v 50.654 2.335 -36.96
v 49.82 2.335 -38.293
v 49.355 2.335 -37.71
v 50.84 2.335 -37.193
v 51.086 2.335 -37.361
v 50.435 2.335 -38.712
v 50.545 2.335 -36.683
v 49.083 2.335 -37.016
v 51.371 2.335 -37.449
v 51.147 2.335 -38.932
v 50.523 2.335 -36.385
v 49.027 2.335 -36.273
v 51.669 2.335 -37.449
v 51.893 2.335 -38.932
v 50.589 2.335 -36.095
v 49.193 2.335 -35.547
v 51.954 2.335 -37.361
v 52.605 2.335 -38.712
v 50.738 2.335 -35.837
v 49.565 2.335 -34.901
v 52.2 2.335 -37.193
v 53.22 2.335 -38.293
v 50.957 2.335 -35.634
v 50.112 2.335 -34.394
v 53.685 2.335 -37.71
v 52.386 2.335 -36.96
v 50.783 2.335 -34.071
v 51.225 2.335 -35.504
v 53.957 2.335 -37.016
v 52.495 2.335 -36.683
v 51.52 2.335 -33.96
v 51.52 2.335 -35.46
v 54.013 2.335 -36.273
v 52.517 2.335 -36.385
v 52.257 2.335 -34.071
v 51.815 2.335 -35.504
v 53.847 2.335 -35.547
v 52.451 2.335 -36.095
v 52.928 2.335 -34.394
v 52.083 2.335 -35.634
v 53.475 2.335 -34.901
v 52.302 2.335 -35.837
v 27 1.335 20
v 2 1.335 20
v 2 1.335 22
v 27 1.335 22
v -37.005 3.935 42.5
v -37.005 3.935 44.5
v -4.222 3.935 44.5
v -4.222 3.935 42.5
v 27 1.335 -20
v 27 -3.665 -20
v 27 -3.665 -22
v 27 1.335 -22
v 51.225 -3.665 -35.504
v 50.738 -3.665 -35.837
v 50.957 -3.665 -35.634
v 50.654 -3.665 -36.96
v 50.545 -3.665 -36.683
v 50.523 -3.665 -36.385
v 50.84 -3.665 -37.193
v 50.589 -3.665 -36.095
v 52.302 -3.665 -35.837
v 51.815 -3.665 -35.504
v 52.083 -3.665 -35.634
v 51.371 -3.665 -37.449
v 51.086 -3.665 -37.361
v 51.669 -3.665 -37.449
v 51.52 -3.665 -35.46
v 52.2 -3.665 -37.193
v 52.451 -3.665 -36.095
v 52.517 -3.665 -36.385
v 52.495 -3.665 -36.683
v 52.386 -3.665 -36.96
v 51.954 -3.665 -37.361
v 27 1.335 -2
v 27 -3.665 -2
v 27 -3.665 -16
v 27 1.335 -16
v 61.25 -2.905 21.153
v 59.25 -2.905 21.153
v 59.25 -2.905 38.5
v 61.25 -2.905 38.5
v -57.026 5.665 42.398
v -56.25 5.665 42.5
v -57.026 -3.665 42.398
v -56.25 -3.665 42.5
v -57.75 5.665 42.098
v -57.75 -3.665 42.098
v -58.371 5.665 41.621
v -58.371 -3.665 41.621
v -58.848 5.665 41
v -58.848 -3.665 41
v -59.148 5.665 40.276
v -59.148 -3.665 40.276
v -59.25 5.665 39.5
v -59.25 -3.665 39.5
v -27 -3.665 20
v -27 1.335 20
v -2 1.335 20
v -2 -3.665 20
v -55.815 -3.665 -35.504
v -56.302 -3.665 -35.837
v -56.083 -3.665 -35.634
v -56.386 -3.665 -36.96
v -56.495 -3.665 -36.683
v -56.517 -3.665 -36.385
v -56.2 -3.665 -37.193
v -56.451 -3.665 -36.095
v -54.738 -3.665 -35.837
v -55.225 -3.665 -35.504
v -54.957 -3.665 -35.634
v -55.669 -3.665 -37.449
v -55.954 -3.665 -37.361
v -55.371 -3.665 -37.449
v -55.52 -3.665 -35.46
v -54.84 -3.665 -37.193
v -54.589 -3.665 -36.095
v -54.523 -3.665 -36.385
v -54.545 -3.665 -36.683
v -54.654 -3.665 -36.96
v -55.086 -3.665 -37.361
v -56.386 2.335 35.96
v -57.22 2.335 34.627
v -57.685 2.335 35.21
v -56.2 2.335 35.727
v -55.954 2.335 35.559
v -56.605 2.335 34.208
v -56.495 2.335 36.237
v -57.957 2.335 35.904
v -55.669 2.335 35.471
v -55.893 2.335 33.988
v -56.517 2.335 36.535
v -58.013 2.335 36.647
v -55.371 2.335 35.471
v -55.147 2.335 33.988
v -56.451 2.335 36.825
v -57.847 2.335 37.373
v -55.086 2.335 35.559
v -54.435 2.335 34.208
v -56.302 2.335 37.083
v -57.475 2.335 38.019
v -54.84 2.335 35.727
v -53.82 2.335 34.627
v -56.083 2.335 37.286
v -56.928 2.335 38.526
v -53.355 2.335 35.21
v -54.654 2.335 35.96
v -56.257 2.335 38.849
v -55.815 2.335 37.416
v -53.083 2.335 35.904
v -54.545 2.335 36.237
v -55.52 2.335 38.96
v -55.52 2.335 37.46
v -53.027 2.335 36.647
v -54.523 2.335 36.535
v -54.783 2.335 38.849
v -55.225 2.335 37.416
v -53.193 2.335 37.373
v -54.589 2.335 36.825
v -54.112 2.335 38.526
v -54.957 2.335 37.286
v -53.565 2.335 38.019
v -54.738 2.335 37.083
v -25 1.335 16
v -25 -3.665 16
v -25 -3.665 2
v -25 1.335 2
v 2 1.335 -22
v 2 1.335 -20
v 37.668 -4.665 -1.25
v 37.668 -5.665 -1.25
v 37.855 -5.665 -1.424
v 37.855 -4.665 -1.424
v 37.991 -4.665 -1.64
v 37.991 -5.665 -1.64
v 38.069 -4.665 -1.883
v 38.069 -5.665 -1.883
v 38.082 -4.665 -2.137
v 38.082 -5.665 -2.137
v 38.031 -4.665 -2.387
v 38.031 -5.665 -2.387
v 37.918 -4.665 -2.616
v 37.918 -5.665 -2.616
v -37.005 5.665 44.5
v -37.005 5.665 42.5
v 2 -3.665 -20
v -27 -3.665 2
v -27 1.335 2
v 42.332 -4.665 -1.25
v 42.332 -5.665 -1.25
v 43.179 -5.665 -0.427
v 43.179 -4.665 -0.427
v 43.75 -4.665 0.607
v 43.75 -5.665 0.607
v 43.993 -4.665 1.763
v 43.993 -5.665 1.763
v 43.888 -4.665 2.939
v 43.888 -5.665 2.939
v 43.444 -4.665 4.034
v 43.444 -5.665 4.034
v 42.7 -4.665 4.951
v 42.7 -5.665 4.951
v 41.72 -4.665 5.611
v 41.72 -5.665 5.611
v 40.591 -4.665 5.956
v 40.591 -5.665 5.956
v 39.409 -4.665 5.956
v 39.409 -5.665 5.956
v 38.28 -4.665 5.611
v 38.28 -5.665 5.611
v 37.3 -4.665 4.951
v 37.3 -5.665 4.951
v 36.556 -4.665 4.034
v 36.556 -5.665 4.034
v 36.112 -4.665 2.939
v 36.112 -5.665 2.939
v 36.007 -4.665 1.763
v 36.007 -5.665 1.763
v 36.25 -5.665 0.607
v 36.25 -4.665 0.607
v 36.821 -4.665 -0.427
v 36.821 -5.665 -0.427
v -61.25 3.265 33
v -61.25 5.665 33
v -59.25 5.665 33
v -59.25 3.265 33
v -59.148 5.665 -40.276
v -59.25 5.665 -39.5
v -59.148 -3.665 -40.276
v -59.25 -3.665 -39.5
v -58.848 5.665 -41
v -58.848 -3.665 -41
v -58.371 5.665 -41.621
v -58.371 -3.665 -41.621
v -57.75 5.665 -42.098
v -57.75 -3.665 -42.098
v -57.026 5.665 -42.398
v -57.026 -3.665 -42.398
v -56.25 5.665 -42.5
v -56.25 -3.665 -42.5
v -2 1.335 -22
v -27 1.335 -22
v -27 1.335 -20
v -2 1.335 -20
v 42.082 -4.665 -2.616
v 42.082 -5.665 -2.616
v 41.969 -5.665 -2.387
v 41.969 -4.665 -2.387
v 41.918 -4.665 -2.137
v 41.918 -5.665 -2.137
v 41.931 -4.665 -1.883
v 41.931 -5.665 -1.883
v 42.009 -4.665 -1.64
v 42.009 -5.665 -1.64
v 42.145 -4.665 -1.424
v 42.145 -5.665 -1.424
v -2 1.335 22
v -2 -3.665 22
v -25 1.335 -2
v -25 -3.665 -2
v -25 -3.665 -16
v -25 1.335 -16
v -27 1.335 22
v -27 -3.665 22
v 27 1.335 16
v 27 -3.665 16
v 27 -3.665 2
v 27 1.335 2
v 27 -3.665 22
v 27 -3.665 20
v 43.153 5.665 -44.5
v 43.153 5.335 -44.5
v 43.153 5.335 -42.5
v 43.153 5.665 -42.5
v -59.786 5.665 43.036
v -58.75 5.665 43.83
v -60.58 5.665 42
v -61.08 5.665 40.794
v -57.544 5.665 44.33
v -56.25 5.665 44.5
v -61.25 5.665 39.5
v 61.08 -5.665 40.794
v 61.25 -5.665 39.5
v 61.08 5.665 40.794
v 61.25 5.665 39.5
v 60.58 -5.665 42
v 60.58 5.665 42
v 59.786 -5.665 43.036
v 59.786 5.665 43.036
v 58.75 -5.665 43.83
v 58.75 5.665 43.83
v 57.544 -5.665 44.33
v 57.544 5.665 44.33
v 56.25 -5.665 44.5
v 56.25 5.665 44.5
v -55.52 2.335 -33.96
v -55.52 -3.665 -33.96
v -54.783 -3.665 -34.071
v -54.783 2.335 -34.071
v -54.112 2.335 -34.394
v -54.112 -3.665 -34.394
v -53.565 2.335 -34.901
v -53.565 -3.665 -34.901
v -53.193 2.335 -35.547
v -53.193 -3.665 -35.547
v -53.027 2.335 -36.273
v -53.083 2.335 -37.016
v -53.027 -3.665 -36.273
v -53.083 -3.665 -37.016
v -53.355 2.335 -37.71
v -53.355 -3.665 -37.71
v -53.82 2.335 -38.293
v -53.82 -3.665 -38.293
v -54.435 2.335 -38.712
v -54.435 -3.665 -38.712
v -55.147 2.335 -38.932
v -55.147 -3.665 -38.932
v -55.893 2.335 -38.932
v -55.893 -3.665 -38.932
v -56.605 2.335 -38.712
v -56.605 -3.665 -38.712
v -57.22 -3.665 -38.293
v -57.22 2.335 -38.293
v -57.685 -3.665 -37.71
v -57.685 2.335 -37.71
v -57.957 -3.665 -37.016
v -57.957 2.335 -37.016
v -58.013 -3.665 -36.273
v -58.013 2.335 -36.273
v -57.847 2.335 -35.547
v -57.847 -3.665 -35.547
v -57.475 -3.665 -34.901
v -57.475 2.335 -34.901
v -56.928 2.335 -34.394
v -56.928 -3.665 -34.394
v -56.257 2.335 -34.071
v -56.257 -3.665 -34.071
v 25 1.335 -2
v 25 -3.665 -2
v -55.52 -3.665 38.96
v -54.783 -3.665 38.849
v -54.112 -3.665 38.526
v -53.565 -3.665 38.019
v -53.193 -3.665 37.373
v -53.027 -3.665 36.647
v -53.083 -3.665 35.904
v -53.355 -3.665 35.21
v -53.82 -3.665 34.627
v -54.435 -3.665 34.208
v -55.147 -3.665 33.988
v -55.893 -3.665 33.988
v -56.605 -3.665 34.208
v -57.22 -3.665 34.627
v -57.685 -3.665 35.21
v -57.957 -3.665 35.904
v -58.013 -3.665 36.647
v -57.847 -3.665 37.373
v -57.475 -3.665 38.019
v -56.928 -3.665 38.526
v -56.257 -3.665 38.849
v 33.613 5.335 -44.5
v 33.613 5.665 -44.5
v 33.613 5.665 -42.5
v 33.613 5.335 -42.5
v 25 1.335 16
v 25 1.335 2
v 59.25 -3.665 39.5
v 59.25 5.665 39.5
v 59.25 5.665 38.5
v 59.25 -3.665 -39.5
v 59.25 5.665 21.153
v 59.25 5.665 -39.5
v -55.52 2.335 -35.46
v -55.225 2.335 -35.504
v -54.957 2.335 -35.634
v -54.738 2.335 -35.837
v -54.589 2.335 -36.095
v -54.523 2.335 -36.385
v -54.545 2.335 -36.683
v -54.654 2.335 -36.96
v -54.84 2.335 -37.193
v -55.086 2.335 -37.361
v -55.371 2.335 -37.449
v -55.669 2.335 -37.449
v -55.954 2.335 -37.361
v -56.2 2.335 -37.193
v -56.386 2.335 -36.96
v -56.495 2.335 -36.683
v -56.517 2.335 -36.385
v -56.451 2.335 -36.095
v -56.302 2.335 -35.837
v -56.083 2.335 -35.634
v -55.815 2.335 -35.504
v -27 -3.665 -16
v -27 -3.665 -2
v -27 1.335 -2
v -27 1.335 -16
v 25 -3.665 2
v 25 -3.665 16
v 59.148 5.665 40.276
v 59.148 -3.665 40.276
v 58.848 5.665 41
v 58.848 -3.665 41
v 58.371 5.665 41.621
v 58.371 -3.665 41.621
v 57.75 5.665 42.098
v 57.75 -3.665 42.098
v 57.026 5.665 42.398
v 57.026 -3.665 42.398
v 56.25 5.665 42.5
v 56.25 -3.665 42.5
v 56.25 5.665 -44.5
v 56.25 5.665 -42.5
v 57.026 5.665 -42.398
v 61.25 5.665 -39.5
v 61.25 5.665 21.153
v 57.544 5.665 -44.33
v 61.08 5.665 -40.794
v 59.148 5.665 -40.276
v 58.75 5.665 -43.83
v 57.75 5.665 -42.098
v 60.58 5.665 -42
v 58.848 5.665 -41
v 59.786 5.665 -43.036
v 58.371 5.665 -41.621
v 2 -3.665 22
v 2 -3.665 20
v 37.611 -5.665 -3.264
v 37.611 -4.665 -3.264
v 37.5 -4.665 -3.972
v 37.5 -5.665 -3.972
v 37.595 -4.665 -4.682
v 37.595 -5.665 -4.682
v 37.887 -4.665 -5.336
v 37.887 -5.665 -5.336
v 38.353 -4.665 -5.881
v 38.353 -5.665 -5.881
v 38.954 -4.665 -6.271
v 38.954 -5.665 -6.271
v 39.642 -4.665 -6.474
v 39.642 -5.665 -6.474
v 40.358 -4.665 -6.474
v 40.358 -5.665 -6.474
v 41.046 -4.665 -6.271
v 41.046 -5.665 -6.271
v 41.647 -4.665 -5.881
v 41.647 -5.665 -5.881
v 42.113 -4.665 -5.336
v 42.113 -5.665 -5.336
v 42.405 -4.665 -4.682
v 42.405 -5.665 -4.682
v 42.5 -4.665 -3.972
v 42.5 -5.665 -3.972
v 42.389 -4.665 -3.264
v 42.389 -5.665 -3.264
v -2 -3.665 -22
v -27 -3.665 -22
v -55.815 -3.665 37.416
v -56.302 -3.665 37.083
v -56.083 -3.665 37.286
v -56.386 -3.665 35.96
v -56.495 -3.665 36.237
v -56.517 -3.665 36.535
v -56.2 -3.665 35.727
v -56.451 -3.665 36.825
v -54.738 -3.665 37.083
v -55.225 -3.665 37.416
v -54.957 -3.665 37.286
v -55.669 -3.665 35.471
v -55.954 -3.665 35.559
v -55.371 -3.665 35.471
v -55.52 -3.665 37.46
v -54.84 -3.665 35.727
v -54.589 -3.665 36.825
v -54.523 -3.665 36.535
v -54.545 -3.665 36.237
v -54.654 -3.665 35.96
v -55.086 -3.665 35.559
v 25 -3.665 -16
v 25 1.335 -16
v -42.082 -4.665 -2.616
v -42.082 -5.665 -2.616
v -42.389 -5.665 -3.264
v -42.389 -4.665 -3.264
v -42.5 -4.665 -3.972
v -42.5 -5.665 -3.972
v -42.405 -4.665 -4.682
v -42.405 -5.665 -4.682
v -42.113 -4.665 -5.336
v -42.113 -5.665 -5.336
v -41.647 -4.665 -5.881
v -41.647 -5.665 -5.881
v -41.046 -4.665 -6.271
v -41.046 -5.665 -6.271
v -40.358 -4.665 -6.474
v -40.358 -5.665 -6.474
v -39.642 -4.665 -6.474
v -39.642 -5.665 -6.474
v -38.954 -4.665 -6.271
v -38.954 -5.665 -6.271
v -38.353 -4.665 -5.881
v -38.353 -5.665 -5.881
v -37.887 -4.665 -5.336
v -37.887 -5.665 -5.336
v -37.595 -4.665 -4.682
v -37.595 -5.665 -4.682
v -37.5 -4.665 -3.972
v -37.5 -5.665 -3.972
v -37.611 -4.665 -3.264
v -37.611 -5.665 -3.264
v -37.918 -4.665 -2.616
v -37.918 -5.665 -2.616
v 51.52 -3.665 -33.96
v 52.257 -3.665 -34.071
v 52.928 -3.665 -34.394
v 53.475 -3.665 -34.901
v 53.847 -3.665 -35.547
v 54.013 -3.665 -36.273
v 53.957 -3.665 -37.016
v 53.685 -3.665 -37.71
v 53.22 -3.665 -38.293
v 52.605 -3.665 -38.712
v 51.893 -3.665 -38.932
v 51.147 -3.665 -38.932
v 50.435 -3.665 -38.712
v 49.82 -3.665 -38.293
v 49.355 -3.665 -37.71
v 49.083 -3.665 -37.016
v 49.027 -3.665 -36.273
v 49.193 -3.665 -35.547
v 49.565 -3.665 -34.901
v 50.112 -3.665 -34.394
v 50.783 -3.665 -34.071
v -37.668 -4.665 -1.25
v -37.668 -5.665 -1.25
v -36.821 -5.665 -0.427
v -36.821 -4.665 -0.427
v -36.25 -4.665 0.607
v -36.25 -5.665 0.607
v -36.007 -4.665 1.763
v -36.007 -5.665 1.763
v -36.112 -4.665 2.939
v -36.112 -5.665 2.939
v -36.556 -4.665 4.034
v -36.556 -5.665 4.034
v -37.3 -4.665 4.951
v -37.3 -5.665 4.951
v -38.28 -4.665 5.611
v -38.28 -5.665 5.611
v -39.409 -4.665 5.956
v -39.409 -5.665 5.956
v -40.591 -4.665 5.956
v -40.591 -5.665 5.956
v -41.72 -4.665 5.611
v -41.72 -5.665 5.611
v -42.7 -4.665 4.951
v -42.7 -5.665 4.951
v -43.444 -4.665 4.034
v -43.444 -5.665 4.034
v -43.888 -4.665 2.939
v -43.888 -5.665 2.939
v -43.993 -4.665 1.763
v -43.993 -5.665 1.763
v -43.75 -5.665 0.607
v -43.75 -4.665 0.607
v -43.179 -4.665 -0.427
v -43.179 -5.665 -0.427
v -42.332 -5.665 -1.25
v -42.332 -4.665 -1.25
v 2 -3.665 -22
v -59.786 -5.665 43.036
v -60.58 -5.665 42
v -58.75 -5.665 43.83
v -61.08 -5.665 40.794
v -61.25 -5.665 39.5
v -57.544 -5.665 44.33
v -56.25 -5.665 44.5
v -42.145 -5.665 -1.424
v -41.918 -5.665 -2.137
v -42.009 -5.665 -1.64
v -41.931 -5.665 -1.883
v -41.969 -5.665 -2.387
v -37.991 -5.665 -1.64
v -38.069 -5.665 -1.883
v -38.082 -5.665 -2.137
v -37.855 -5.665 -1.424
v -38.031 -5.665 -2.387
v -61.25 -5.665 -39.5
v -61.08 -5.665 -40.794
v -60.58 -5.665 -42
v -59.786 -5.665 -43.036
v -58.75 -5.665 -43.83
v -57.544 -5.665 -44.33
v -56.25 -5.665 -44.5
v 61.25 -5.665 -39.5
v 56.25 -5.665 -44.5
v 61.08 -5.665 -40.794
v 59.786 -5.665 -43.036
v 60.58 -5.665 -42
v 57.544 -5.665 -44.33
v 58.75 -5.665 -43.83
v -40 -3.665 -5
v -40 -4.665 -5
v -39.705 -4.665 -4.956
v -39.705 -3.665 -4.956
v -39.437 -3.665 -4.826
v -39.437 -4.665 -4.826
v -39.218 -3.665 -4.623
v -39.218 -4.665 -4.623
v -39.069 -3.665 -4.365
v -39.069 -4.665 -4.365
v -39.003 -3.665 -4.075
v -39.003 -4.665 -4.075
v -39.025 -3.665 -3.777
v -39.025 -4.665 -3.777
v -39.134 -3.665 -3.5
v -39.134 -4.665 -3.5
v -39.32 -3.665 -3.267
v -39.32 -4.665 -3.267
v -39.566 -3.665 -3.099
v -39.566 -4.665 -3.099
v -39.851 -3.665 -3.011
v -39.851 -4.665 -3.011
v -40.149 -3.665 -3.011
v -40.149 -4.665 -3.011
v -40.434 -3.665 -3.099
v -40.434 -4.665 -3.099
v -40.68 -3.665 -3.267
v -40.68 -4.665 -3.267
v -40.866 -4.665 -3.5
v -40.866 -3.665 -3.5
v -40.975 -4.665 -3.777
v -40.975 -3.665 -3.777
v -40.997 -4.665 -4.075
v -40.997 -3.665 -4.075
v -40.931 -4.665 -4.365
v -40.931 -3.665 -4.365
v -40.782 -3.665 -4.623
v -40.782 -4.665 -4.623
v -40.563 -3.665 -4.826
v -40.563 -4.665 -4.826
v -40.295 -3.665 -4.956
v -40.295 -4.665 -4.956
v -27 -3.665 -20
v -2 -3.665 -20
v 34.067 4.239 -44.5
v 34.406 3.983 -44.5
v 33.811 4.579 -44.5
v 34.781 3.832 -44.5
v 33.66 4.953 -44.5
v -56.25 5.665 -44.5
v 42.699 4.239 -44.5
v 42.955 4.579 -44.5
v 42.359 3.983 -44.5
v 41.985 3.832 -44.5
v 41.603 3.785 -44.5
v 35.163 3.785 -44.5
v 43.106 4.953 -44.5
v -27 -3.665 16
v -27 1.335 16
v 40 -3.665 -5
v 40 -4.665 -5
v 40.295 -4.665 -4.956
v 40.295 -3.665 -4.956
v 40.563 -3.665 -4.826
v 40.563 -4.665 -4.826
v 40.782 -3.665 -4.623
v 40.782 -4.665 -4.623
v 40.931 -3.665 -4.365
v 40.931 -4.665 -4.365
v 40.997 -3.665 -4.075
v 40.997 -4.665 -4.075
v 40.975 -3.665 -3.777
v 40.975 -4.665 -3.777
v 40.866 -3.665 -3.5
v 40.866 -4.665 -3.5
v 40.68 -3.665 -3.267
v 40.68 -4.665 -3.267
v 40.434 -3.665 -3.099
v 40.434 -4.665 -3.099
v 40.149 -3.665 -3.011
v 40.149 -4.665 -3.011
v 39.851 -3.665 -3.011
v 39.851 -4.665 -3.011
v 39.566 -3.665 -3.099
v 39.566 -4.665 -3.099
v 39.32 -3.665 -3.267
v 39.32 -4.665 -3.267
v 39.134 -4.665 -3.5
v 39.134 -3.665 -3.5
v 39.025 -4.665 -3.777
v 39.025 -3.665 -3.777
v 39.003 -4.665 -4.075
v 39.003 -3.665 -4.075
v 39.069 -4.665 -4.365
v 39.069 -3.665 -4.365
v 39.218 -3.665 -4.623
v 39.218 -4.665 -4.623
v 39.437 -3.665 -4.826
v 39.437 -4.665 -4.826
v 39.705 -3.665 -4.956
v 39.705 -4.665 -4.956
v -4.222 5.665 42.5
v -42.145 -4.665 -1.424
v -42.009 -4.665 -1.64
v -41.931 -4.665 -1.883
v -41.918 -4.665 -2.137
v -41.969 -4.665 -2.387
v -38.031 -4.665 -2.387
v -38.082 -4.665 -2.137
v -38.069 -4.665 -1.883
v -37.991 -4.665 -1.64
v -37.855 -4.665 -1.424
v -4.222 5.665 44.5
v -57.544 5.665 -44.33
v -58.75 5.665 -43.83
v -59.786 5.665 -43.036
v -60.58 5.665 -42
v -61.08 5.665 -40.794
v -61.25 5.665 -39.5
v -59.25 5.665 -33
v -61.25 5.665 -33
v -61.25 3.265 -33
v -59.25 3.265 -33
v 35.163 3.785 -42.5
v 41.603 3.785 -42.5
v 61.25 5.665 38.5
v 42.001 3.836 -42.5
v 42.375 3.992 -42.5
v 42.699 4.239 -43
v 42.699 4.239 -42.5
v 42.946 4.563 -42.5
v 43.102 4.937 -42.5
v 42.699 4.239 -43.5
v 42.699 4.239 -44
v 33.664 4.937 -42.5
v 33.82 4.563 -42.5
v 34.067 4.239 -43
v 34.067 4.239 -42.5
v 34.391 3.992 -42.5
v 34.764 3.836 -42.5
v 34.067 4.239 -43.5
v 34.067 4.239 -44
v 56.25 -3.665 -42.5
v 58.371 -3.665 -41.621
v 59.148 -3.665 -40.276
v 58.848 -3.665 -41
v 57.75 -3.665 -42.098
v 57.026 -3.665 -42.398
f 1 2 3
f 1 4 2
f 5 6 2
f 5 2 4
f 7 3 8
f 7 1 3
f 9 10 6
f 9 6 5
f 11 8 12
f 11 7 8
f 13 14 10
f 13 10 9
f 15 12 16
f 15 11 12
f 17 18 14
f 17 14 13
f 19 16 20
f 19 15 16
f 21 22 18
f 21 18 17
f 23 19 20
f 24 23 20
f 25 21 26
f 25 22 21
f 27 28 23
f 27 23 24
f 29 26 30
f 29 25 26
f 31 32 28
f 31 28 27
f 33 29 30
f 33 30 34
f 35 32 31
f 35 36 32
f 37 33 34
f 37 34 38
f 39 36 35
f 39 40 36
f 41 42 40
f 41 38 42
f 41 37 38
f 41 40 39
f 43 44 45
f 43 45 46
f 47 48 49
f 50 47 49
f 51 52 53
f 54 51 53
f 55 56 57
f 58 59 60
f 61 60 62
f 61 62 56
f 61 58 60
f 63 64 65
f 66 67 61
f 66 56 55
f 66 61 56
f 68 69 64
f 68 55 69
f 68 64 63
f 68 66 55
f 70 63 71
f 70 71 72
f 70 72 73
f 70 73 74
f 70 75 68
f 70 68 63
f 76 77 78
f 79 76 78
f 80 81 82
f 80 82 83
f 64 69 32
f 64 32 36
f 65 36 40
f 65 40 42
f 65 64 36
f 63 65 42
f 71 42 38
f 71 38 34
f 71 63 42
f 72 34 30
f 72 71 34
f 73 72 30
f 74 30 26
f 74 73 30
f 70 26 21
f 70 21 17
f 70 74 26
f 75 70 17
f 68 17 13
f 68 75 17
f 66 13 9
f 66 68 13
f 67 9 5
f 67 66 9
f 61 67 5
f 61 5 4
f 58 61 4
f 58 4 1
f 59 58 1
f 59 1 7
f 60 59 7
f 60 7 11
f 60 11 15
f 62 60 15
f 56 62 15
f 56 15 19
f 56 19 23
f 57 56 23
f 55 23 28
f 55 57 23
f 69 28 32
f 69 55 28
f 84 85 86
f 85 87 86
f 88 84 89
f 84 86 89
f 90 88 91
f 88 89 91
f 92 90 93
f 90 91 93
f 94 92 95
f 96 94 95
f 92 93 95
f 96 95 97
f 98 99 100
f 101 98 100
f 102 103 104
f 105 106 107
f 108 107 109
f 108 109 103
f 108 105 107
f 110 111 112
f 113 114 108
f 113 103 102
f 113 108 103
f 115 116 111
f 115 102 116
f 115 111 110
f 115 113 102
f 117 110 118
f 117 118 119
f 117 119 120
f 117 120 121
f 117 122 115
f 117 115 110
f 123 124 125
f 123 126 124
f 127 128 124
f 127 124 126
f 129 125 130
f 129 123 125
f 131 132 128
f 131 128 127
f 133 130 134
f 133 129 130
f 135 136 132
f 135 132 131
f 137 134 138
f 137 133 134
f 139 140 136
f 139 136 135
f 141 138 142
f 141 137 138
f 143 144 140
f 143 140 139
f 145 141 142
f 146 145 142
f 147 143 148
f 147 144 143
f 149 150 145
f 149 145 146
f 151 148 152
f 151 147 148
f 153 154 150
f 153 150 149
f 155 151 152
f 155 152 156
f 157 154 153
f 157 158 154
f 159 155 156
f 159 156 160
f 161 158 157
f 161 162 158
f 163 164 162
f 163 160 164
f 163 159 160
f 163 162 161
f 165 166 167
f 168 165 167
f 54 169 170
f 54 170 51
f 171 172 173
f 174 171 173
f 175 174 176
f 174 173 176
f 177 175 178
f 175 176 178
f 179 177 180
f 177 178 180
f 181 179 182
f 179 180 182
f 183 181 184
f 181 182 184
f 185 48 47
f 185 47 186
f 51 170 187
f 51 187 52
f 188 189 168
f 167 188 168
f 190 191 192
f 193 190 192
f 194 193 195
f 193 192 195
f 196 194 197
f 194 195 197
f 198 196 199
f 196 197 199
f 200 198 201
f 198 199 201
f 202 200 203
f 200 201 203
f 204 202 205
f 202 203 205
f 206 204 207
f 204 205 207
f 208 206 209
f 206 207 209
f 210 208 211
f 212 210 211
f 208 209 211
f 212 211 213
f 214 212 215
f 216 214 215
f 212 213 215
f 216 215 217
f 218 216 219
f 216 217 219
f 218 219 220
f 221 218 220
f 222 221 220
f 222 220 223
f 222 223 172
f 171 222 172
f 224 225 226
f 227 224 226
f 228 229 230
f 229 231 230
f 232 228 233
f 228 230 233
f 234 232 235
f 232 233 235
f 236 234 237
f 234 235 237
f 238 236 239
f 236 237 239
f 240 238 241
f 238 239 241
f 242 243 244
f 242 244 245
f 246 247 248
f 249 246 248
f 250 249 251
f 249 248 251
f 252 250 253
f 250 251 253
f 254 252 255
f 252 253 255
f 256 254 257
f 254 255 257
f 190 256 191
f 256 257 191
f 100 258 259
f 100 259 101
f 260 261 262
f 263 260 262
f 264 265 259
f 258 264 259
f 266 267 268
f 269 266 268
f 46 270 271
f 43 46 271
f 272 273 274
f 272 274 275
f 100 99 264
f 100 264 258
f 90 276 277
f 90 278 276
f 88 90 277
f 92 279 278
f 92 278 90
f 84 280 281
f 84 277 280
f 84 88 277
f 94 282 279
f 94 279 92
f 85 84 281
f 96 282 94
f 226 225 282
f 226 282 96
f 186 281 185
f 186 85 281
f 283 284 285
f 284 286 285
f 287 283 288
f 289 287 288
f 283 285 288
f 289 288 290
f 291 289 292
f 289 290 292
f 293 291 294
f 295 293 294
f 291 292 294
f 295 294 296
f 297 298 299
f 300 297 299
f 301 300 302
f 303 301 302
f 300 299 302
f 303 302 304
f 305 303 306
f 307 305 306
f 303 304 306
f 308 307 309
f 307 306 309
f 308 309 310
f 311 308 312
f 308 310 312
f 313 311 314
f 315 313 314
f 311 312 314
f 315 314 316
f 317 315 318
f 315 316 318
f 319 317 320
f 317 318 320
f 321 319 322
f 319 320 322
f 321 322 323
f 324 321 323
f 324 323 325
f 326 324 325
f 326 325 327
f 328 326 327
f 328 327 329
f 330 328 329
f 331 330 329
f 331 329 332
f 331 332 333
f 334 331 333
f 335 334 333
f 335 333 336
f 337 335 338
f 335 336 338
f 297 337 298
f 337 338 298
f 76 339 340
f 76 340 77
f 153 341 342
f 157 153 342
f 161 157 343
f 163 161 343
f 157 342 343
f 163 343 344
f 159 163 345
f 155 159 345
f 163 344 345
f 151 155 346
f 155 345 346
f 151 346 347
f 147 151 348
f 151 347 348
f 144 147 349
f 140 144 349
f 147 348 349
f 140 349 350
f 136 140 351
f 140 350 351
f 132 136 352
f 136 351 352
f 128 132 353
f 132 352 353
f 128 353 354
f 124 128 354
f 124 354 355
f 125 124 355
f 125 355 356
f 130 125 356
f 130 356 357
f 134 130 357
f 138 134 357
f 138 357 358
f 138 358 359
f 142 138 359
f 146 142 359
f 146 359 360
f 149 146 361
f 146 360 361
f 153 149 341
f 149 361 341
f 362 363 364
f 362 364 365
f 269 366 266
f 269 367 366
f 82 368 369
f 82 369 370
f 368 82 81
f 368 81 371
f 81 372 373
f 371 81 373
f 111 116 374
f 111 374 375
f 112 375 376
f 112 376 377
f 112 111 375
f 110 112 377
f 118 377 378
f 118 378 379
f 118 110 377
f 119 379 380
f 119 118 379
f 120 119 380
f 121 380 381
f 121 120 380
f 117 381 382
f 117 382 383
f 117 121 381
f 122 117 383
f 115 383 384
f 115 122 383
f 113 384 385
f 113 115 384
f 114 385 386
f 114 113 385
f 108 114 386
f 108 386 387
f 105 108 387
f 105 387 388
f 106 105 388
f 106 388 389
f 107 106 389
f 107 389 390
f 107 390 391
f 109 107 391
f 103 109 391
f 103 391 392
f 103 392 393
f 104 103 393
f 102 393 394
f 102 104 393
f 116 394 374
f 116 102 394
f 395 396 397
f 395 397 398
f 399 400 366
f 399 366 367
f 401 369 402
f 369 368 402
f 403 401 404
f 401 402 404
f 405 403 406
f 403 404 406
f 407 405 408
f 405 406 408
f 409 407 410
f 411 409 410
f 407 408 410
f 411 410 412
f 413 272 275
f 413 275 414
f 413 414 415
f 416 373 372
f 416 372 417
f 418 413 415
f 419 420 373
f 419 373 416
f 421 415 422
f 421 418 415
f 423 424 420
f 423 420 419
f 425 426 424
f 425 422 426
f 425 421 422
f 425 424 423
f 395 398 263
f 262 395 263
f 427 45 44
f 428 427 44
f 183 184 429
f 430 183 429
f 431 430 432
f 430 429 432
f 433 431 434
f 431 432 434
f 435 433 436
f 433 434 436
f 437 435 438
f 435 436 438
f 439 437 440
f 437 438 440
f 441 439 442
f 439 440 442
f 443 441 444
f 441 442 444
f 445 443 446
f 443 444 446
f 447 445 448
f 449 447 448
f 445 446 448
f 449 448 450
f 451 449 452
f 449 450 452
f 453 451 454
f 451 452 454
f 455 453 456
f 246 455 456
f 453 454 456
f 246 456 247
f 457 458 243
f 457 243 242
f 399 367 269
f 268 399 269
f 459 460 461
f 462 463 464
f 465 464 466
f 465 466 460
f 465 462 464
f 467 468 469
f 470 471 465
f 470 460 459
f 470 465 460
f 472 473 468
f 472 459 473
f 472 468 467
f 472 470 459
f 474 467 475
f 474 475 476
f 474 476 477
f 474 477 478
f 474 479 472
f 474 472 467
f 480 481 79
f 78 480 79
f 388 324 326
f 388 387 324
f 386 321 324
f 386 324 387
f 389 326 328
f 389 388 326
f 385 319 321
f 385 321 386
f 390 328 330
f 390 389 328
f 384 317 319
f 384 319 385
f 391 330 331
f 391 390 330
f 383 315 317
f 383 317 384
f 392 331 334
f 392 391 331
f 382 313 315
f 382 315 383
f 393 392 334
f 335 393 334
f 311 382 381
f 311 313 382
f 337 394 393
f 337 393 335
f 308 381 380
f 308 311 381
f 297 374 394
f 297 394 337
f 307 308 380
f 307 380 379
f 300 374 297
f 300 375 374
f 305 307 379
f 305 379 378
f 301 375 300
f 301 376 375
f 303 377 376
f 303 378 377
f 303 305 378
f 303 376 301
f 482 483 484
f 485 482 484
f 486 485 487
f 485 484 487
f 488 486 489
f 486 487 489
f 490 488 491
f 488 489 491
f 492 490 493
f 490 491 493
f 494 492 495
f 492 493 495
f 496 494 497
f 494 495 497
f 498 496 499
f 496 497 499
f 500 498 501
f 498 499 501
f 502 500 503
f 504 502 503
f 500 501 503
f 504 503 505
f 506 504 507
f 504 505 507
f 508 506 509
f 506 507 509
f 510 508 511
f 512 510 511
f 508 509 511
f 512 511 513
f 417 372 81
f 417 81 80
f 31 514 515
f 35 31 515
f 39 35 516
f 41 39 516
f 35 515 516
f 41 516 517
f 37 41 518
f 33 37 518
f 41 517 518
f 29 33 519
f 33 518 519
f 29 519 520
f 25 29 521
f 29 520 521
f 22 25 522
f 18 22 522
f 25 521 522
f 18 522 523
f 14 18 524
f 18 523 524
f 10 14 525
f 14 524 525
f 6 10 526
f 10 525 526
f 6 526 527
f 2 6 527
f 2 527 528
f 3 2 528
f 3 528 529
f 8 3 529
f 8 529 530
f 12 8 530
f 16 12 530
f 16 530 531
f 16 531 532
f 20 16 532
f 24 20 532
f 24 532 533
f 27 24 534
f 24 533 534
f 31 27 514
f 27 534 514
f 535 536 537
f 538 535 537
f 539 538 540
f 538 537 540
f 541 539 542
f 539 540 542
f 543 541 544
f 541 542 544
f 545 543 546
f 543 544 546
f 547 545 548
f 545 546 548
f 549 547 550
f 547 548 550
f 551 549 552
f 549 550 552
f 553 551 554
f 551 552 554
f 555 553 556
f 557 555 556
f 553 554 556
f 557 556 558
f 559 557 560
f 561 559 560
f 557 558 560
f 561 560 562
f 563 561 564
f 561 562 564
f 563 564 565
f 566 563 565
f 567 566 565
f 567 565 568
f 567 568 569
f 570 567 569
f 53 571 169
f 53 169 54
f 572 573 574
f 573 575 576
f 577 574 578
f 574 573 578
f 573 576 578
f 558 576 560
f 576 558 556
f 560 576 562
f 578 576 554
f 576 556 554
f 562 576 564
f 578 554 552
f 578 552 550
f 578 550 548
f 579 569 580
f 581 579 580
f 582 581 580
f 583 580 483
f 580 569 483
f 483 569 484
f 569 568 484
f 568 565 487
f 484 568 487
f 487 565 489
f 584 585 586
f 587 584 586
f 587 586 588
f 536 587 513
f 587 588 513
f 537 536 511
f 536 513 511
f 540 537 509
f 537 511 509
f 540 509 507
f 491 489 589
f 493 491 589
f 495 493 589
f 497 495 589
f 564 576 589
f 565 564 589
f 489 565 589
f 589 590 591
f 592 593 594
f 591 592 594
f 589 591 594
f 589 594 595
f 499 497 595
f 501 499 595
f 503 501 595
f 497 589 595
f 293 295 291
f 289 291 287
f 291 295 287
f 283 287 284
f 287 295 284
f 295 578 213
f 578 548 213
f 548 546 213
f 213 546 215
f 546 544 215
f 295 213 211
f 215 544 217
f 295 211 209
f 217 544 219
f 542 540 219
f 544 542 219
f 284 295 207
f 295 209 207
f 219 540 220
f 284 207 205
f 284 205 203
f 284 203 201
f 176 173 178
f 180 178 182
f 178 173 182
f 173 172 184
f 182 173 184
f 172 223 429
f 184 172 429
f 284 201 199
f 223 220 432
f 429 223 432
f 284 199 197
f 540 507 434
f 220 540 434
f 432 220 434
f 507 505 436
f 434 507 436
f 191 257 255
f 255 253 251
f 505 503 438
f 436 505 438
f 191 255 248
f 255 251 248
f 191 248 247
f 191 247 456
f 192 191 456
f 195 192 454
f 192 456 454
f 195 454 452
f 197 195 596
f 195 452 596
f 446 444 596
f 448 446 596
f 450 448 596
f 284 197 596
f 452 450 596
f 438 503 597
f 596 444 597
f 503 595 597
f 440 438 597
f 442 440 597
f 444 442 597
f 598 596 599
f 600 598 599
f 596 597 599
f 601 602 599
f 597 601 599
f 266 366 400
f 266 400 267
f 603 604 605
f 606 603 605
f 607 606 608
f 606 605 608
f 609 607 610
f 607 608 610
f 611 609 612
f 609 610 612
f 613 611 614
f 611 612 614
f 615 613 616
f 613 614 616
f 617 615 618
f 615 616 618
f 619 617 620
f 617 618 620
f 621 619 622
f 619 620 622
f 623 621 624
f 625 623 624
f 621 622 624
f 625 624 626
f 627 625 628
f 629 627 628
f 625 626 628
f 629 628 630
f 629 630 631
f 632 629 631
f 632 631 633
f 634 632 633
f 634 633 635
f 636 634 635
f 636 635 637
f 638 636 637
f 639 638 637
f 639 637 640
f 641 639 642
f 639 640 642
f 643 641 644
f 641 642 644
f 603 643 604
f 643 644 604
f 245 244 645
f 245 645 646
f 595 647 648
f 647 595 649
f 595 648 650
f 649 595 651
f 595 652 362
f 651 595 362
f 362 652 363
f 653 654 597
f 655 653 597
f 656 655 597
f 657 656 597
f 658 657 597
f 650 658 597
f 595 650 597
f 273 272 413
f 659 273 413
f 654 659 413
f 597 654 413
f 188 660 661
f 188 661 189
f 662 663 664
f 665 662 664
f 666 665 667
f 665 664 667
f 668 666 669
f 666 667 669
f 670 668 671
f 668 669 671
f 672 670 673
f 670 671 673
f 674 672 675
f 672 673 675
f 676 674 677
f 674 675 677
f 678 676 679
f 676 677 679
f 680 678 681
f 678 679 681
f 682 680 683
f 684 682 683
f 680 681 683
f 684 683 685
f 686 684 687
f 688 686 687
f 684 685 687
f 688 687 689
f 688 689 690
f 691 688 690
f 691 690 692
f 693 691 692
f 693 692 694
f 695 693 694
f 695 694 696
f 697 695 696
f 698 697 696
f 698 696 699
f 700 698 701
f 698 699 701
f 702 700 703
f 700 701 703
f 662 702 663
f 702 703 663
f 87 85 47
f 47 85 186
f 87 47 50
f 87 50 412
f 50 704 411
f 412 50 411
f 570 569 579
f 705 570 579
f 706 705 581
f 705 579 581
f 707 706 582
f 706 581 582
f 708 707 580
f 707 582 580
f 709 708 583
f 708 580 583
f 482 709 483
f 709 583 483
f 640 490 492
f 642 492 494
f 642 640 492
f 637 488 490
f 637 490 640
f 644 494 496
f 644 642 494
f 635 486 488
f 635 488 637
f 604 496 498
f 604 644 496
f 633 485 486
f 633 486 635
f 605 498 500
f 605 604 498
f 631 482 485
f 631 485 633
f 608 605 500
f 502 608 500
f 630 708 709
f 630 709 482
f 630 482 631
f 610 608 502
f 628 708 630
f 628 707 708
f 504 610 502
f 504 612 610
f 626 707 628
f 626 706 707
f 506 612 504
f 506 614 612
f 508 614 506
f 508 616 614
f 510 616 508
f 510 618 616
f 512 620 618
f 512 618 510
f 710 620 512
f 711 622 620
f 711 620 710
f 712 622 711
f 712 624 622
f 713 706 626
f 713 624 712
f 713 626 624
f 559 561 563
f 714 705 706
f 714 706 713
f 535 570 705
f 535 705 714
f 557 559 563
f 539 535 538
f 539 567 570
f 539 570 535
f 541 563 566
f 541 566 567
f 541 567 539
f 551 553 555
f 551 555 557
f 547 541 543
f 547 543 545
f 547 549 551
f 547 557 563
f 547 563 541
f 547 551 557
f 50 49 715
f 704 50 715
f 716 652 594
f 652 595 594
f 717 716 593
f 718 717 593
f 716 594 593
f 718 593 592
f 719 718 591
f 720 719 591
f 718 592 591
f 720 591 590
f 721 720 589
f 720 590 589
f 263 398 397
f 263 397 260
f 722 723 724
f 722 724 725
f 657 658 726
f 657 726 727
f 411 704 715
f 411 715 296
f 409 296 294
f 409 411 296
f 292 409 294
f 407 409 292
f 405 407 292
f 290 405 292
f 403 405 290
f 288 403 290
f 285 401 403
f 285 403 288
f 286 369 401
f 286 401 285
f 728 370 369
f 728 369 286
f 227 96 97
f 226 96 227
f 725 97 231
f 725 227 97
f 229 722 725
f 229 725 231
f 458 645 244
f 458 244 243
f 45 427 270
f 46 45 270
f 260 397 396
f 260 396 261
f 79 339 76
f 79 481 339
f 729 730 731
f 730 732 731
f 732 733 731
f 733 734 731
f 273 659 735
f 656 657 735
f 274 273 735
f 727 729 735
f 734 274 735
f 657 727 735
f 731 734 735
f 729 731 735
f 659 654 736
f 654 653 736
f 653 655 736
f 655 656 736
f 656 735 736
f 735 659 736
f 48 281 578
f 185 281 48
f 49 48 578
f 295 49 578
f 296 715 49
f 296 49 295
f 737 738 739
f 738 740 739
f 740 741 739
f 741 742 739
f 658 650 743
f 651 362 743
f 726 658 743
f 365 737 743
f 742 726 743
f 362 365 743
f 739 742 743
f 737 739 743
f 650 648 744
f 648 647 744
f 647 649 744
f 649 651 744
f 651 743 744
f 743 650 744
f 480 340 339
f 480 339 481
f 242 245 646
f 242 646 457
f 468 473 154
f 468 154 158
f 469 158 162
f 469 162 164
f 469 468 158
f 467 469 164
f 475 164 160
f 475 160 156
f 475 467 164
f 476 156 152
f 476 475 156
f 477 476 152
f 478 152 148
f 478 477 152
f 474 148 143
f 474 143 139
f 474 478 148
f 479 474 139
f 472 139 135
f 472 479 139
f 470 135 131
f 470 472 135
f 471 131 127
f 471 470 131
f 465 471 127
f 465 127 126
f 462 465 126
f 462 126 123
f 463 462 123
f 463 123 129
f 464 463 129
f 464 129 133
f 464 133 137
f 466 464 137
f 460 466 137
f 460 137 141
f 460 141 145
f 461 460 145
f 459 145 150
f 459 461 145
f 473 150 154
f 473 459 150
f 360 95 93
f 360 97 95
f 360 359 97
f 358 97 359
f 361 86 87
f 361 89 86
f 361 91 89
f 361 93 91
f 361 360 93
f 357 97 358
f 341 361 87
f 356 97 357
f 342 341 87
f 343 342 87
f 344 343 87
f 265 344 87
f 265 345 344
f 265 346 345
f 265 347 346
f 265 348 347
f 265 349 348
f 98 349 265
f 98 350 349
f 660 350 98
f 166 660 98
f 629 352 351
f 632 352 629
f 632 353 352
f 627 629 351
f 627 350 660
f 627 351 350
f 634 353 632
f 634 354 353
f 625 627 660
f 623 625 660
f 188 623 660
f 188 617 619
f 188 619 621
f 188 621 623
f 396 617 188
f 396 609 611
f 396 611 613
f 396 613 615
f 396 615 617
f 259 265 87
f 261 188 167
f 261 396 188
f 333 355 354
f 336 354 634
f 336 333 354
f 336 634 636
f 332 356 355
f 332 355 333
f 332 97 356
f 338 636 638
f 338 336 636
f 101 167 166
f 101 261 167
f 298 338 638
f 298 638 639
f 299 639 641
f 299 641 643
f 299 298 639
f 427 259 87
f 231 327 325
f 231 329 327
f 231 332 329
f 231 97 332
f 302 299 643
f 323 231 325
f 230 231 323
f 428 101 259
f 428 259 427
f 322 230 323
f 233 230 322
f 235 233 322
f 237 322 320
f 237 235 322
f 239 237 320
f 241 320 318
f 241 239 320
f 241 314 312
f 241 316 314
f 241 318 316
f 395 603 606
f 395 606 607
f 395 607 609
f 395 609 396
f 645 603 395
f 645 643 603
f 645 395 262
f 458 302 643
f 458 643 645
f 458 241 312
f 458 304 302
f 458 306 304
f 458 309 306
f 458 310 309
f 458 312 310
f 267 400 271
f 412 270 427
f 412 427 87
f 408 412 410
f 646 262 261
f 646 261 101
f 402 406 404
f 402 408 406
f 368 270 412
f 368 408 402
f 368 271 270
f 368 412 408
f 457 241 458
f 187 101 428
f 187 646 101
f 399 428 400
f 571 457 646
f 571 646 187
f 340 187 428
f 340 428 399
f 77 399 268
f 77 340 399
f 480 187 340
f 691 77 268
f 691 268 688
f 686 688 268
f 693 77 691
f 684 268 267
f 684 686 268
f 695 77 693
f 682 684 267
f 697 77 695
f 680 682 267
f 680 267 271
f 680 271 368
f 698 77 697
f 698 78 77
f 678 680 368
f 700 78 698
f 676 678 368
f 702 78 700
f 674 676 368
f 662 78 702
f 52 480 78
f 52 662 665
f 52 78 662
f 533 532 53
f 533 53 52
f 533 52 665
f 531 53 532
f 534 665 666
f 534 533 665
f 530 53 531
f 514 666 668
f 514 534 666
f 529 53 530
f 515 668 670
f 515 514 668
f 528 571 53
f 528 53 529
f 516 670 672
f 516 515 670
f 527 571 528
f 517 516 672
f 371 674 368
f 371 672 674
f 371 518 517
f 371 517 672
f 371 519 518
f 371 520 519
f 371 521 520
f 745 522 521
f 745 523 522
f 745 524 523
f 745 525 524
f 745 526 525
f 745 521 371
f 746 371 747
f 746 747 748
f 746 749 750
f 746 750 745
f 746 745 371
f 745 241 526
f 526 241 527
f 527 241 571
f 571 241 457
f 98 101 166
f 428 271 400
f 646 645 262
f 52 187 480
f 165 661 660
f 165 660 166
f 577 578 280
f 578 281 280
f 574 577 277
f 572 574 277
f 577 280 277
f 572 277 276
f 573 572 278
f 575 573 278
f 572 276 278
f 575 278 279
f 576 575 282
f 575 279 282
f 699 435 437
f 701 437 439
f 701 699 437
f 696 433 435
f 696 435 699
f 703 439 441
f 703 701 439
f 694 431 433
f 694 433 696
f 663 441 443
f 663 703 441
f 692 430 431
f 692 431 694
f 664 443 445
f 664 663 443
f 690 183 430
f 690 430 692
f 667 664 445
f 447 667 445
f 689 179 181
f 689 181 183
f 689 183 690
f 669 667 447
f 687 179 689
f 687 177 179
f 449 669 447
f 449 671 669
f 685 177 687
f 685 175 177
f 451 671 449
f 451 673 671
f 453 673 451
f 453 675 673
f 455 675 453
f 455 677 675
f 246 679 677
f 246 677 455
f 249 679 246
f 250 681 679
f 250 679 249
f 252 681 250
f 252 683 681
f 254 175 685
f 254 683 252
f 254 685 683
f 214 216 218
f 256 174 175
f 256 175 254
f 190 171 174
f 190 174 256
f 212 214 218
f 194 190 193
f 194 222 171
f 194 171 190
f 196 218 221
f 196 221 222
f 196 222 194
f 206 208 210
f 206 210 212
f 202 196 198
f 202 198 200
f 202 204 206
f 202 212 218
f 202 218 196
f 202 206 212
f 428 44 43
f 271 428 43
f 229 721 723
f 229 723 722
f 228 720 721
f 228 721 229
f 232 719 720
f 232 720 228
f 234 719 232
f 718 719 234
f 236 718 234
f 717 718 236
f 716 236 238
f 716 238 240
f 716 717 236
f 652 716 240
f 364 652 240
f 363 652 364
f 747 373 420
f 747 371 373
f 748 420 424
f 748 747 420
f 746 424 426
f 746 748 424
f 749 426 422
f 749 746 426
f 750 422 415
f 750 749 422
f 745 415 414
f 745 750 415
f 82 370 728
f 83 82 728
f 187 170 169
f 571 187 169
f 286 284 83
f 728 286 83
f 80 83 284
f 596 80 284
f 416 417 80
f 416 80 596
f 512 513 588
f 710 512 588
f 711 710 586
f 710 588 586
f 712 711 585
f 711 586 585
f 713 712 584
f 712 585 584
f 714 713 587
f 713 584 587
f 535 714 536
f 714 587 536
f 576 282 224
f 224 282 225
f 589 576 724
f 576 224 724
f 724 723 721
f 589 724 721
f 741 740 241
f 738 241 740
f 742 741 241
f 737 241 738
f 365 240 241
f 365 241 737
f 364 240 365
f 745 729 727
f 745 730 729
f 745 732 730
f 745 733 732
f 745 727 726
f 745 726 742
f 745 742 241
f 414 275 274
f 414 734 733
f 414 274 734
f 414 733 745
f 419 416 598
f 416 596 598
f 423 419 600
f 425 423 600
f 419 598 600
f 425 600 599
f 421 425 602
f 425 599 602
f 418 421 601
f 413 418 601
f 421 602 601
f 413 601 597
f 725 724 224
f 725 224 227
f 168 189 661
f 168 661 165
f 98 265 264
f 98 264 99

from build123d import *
from OCP.BRepFilletAPI import BRepFilletAPI_MakeFillet

# Parameters (mm, degrees)
SKETCH1_W           = 122.5
SKETCH1_H           = 89
BOSS_EXTRUDE1_DEPTH = 5.665
SHELL1_T            = -2
SKETCH2_R           = 2.5
SKETCH2_R_2         = 1
BOSS_EXTRUDE2_DEPTH = 6
FILLET1_R1          = 3
FILLET1_R2          = 5
SKETCH6_W           = 2
SKETCH6_H           = 66
CUT_EXTRUDE1_DEPTH  = 2.4
SKETCH7_W           = 2
SKETCH7_H           = 17.347336969
CUT_EXTRUDE2_DEPTH  = 8.57
CUT_EXTRUDE5_DEPTH  = 10
SKETCH13_W          = 32.782947734
SKETCH13_H          = 2.623502387
CUT_EXTRUDE6_DEPTH  = 10
SKETCH14_W          = 54
SKETCH14_H          = 44
SKETCH14_W_2        = 50
SKETCH14_H_2        = 40
BOSS_EXTRUDE3_DEPTH = 5
SKETCH15_W          = 2
SKETCH15_H          = 4
SKETCH15_W_2        = 4
SKETCH15_H_2        = 2
CUT_EXTRUDE7_DEPTH  = 5
CUT_EXTRUDE9_DEPTH  = 1
SKETCH17_R          = 1
CUT_EXTRUDE10_DEPTH = 1


with BuildPart() as part:
    # Sketch1 → Boss-Extrude1 (new, symmetric)
    with BuildSketch(Plane(origin=(0, 0, 0), x_dir=(1, 0, 0), z_dir=(0, 1, 0))):
        Rectangle(SKETCH1_W, SKETCH1_H)
    extrude(amount=BOSS_EXTRUDE1_DEPTH, both=True)

    # Shell1
    shell1_openings = [part.faces().sort_by_distance(p)[0] for p in [
        (0, 5.665, 0),
    ]]
    offset(amount=SHELL1_T, openings=shell1_openings, kind=Kind.INTERSECTION)

    # Sketch2 → Boss-Extrude2 (add)
    # profile 1 of 3: a face of its own
    with BuildSketch(Plane(origin=(0, -3.665, 0), x_dir=(1, 0, 0), z_dir=(0, 1, 0))):
        with Locations((-55.52, 36.46)):
            Circle(SKETCH2_R)
        with Locations((-55.52, 36.46)):
            Circle(SKETCH2_R_2, mode=Mode.SUBTRACT)
    # profile 2 of 3: a face of its own
    with BuildSketch(Plane(origin=(0, -3.665, 0), x_dir=(1, 0, 0), z_dir=(0, 1, 0))):
        with Locations((51.52, 36.46)):
            Circle(SKETCH2_R)
        with Locations((51.52, 36.46)):
            Circle(SKETCH2_R_2, mode=Mode.SUBTRACT)
    # profile 3 of 3: a face of its own
    with BuildSketch(Plane(origin=(0, -3.665, 0), x_dir=(1, 0, 0), z_dir=(0, 1, 0))):
        with Locations((-55.52, -36.46)):
            Circle(SKETCH2_R)
        with Locations((-55.52, -36.46)):
            Circle(SKETCH2_R_2, mode=Mode.SUBTRACT)
    extrude(amount=BOSS_EXTRUDE2_DEPTH)

    # Fillet1: one fillet with a radius per group of edges: ONE call of the kernel's fillet builder (fillet() takes one radius for all edges)
    fillet1_edges_1 = [part.edges().sort_by_distance(p)[0] for p in [
        (-59.25, 1, -42.5),
        (59.25, 1, -42.5),
        (59.25, 1, 42.5),
        (-59.25, 1, 42.5),
    ]]
    fillet1_edges_2 = [part.edges().sort_by_distance(p)[0] for p in [
        (-61.25, 0, -44.5),
        (61.25, 0, -44.5),
        (61.25, 0, 44.5),
        (-61.25, 0, 44.5),
    ]]
    fillet1 = BRepFilletAPI_MakeFillet(part.part.solid().wrapped)
    for e in fillet1_edges_1:
        fillet1.Add(FILLET1_R1, e.wrapped)
    for e in fillet1_edges_2:
        fillet1.Add(FILLET1_R2, e.wrapped)
    add(Compound.cast(fillet1.Shape()), mode=Mode.REPLACE)

    # Sketch6 → Cut-Extrude1 (cut)
    with BuildSketch(Plane(origin=(0, 5.665, 0), x_dir=(1, 0, 0), z_dir=(0, 1, 0))):
        with Locations((-60.25, 0)):
            Rectangle(SKETCH6_W, SKETCH6_H)
    extrude(amount=-CUT_EXTRUDE1_DEPTH, mode=Mode.SUBTRACT)

    # Sketch7 → Cut-Extrude2 (cut)
    with BuildSketch(Plane(origin=(0, 5.665, 0), x_dir=(1, 0, 0), z_dir=(0, 1, 0))):
        with Locations((60.25, -29.826331516)):
            Rectangle(SKETCH7_W, SKETCH7_H)
    extrude(amount=-CUT_EXTRUDE2_DEPTH, mode=Mode.SUBTRACT)

    # Sketch12 → Cut-Extrude5 (cut)
    with BuildSketch(Plane(origin=(0, 0, -44.5), x_dir=(-1, 0, 0), z_dir=(0, 0, -1))):
        with BuildLine():
            Line((-42.852887486, 5.665199886), (-33.912887486, 5.665199886))
            Line((-33.912887486, 5.665199886), (-33.612887486, 5.665))
            Line((-33.612887486, 5.665), (-33.612887486, 5.335199886))
            add(Edge.make_bspline(
                [(-35.162887486, 3.785199886), (-34.969276417, 3.785199886), (-34.590674628, 3.851796456), (-34.032768291, 4.205080692), (-33.679484056, 4.762987029), (-33.612887486, 5.141588818), (-33.612887486, 5.335199886)],
                knots=[0, 0, 0, 0, 0.25, 0.5, 0.75, 1, 1, 1, 1], degree=3))
            Line((-35.162887486, 3.785199886), (-41.602887486, 3.785199886))
            add(Edge.make_bspline(
                [(-43.152887486, 5.335199886), (-43.152887486, 5.141588818), (-43.086290916, 4.762987029), (-42.73300668, 4.205080692), (-42.175100343, 3.851796456), (-41.796498554, 3.785199886), (-41.602887486, 3.785199886)],
                knots=[0, 0, 0, 0, 0.25, 0.5, 0.75, 1, 1, 1, 1], degree=3))
            Line((-43.152887486, 5.335199886), (-43.152887486, 5.665))
            Line((-43.152887486, 5.665), (-42.852887486, 5.665199886))
        make_face()
    extrude(amount=-CUT_EXTRUDE5_DEPTH, mode=Mode.SUBTRACT)

    # Sketch13 → Cut-Extrude6 (cut)
    with BuildSketch(Plane.XY.offset(44.5)):
        with Locations((-20.613592251, 5.246951194)):
            Rectangle(SKETCH13_W, SKETCH13_H)
    extrude(amount=-CUT_EXTRUDE6_DEPTH, mode=Mode.SUBTRACT)

    # Sketch14 → Boss-Extrude3 (add)
    with BuildSketch(Plane(origin=(0, -3.665, 0), x_dir=(1, 0, 0), z_dir=(0, 1, 0))):
        Rectangle(SKETCH14_W, SKETCH14_H)
        Rectangle(SKETCH14_W_2, SKETCH14_H_2, mode=Mode.SUBTRACT)
    extrude(amount=BOSS_EXTRUDE3_DEPTH)

    # Sketch15 → Cut-Extrude7 (cut)
    with BuildSketch(Plane(origin=(0, 1.335, 0), x_dir=(1, 0, 0), z_dir=(0, 1, 0))):
        with Locations((-26, 18)):
            Rectangle(SKETCH15_W, SKETCH15_H)
        with Locations((-26, 0)):
            Rectangle(SKETCH15_W, SKETCH15_H)
        with Locations((-26, -18)):
            Rectangle(SKETCH15_W, SKETCH15_H)
        with Locations((26, -18)):
            Rectangle(SKETCH15_W, SKETCH15_H)
        with Locations((26, 0)):
            Rectangle(SKETCH15_W, SKETCH15_H)
        with Locations((26, 18)):
            Rectangle(SKETCH15_W, SKETCH15_H)
        with Locations((0, 21)):
            Rectangle(SKETCH15_W_2, SKETCH15_H_2)
        with Locations((0, -21)):
            Rectangle(SKETCH15_W_2, SKETCH15_H_2)
    extrude(amount=-CUT_EXTRUDE7_DEPTH, mode=Mode.SUBTRACT)

    # Sketch16 → Cut-Extrude9 (cut)
    with BuildSketch(Plane.XZ.offset(5.665)):
        with BuildLine():
            ThreePointArc((37.917995747, -2.616071429), (40, -6.5), (42.082004253, -2.616071429))
            ThreePointArc((42.082004253, -2.616071429), (41.931122098, -1.882594271), (42.331844763, -1.25))
            ThreePointArc((42.331844763, -1.25), (40, 6), (37.668155237, -1.25))
            ThreePointArc((37.668155237, -1.25), (38.068877902, -1.882594271), (37.917995747, -2.616071429))
        make_face()
        with BuildLine():
            ThreePointArc((-42.082004253, -2.616071429), (-40, -6.5), (-37.917995747, -2.616071429))
            ThreePointArc((-37.917995747, -2.616071429), (-38.068877902, -1.882594271), (-37.668155237, -1.25))
            ThreePointArc((-37.668155237, -1.25), (-40, 6), (-42.331844763, -1.25))
            ThreePointArc((-42.331844763, -1.25), (-41.931122098, -1.882594271), (-42.082004253, -2.616071429))
        make_face()
    extrude(amount=-CUT_EXTRUDE9_DEPTH, mode=Mode.SUBTRACT)

    # Sketch17 → Cut-Extrude10 (cut)
    with BuildSketch(Plane.XZ.offset(4.665)):
        with Locations((-40, -4)):
            Circle(SKETCH17_R)
        with Locations((40, -4)):
            Circle(SKETCH17_R)
    extrude(amount=-CUT_EXTRUDE10_DEPTH, mode=Mode.SUBTRACT)


solid = part.part
